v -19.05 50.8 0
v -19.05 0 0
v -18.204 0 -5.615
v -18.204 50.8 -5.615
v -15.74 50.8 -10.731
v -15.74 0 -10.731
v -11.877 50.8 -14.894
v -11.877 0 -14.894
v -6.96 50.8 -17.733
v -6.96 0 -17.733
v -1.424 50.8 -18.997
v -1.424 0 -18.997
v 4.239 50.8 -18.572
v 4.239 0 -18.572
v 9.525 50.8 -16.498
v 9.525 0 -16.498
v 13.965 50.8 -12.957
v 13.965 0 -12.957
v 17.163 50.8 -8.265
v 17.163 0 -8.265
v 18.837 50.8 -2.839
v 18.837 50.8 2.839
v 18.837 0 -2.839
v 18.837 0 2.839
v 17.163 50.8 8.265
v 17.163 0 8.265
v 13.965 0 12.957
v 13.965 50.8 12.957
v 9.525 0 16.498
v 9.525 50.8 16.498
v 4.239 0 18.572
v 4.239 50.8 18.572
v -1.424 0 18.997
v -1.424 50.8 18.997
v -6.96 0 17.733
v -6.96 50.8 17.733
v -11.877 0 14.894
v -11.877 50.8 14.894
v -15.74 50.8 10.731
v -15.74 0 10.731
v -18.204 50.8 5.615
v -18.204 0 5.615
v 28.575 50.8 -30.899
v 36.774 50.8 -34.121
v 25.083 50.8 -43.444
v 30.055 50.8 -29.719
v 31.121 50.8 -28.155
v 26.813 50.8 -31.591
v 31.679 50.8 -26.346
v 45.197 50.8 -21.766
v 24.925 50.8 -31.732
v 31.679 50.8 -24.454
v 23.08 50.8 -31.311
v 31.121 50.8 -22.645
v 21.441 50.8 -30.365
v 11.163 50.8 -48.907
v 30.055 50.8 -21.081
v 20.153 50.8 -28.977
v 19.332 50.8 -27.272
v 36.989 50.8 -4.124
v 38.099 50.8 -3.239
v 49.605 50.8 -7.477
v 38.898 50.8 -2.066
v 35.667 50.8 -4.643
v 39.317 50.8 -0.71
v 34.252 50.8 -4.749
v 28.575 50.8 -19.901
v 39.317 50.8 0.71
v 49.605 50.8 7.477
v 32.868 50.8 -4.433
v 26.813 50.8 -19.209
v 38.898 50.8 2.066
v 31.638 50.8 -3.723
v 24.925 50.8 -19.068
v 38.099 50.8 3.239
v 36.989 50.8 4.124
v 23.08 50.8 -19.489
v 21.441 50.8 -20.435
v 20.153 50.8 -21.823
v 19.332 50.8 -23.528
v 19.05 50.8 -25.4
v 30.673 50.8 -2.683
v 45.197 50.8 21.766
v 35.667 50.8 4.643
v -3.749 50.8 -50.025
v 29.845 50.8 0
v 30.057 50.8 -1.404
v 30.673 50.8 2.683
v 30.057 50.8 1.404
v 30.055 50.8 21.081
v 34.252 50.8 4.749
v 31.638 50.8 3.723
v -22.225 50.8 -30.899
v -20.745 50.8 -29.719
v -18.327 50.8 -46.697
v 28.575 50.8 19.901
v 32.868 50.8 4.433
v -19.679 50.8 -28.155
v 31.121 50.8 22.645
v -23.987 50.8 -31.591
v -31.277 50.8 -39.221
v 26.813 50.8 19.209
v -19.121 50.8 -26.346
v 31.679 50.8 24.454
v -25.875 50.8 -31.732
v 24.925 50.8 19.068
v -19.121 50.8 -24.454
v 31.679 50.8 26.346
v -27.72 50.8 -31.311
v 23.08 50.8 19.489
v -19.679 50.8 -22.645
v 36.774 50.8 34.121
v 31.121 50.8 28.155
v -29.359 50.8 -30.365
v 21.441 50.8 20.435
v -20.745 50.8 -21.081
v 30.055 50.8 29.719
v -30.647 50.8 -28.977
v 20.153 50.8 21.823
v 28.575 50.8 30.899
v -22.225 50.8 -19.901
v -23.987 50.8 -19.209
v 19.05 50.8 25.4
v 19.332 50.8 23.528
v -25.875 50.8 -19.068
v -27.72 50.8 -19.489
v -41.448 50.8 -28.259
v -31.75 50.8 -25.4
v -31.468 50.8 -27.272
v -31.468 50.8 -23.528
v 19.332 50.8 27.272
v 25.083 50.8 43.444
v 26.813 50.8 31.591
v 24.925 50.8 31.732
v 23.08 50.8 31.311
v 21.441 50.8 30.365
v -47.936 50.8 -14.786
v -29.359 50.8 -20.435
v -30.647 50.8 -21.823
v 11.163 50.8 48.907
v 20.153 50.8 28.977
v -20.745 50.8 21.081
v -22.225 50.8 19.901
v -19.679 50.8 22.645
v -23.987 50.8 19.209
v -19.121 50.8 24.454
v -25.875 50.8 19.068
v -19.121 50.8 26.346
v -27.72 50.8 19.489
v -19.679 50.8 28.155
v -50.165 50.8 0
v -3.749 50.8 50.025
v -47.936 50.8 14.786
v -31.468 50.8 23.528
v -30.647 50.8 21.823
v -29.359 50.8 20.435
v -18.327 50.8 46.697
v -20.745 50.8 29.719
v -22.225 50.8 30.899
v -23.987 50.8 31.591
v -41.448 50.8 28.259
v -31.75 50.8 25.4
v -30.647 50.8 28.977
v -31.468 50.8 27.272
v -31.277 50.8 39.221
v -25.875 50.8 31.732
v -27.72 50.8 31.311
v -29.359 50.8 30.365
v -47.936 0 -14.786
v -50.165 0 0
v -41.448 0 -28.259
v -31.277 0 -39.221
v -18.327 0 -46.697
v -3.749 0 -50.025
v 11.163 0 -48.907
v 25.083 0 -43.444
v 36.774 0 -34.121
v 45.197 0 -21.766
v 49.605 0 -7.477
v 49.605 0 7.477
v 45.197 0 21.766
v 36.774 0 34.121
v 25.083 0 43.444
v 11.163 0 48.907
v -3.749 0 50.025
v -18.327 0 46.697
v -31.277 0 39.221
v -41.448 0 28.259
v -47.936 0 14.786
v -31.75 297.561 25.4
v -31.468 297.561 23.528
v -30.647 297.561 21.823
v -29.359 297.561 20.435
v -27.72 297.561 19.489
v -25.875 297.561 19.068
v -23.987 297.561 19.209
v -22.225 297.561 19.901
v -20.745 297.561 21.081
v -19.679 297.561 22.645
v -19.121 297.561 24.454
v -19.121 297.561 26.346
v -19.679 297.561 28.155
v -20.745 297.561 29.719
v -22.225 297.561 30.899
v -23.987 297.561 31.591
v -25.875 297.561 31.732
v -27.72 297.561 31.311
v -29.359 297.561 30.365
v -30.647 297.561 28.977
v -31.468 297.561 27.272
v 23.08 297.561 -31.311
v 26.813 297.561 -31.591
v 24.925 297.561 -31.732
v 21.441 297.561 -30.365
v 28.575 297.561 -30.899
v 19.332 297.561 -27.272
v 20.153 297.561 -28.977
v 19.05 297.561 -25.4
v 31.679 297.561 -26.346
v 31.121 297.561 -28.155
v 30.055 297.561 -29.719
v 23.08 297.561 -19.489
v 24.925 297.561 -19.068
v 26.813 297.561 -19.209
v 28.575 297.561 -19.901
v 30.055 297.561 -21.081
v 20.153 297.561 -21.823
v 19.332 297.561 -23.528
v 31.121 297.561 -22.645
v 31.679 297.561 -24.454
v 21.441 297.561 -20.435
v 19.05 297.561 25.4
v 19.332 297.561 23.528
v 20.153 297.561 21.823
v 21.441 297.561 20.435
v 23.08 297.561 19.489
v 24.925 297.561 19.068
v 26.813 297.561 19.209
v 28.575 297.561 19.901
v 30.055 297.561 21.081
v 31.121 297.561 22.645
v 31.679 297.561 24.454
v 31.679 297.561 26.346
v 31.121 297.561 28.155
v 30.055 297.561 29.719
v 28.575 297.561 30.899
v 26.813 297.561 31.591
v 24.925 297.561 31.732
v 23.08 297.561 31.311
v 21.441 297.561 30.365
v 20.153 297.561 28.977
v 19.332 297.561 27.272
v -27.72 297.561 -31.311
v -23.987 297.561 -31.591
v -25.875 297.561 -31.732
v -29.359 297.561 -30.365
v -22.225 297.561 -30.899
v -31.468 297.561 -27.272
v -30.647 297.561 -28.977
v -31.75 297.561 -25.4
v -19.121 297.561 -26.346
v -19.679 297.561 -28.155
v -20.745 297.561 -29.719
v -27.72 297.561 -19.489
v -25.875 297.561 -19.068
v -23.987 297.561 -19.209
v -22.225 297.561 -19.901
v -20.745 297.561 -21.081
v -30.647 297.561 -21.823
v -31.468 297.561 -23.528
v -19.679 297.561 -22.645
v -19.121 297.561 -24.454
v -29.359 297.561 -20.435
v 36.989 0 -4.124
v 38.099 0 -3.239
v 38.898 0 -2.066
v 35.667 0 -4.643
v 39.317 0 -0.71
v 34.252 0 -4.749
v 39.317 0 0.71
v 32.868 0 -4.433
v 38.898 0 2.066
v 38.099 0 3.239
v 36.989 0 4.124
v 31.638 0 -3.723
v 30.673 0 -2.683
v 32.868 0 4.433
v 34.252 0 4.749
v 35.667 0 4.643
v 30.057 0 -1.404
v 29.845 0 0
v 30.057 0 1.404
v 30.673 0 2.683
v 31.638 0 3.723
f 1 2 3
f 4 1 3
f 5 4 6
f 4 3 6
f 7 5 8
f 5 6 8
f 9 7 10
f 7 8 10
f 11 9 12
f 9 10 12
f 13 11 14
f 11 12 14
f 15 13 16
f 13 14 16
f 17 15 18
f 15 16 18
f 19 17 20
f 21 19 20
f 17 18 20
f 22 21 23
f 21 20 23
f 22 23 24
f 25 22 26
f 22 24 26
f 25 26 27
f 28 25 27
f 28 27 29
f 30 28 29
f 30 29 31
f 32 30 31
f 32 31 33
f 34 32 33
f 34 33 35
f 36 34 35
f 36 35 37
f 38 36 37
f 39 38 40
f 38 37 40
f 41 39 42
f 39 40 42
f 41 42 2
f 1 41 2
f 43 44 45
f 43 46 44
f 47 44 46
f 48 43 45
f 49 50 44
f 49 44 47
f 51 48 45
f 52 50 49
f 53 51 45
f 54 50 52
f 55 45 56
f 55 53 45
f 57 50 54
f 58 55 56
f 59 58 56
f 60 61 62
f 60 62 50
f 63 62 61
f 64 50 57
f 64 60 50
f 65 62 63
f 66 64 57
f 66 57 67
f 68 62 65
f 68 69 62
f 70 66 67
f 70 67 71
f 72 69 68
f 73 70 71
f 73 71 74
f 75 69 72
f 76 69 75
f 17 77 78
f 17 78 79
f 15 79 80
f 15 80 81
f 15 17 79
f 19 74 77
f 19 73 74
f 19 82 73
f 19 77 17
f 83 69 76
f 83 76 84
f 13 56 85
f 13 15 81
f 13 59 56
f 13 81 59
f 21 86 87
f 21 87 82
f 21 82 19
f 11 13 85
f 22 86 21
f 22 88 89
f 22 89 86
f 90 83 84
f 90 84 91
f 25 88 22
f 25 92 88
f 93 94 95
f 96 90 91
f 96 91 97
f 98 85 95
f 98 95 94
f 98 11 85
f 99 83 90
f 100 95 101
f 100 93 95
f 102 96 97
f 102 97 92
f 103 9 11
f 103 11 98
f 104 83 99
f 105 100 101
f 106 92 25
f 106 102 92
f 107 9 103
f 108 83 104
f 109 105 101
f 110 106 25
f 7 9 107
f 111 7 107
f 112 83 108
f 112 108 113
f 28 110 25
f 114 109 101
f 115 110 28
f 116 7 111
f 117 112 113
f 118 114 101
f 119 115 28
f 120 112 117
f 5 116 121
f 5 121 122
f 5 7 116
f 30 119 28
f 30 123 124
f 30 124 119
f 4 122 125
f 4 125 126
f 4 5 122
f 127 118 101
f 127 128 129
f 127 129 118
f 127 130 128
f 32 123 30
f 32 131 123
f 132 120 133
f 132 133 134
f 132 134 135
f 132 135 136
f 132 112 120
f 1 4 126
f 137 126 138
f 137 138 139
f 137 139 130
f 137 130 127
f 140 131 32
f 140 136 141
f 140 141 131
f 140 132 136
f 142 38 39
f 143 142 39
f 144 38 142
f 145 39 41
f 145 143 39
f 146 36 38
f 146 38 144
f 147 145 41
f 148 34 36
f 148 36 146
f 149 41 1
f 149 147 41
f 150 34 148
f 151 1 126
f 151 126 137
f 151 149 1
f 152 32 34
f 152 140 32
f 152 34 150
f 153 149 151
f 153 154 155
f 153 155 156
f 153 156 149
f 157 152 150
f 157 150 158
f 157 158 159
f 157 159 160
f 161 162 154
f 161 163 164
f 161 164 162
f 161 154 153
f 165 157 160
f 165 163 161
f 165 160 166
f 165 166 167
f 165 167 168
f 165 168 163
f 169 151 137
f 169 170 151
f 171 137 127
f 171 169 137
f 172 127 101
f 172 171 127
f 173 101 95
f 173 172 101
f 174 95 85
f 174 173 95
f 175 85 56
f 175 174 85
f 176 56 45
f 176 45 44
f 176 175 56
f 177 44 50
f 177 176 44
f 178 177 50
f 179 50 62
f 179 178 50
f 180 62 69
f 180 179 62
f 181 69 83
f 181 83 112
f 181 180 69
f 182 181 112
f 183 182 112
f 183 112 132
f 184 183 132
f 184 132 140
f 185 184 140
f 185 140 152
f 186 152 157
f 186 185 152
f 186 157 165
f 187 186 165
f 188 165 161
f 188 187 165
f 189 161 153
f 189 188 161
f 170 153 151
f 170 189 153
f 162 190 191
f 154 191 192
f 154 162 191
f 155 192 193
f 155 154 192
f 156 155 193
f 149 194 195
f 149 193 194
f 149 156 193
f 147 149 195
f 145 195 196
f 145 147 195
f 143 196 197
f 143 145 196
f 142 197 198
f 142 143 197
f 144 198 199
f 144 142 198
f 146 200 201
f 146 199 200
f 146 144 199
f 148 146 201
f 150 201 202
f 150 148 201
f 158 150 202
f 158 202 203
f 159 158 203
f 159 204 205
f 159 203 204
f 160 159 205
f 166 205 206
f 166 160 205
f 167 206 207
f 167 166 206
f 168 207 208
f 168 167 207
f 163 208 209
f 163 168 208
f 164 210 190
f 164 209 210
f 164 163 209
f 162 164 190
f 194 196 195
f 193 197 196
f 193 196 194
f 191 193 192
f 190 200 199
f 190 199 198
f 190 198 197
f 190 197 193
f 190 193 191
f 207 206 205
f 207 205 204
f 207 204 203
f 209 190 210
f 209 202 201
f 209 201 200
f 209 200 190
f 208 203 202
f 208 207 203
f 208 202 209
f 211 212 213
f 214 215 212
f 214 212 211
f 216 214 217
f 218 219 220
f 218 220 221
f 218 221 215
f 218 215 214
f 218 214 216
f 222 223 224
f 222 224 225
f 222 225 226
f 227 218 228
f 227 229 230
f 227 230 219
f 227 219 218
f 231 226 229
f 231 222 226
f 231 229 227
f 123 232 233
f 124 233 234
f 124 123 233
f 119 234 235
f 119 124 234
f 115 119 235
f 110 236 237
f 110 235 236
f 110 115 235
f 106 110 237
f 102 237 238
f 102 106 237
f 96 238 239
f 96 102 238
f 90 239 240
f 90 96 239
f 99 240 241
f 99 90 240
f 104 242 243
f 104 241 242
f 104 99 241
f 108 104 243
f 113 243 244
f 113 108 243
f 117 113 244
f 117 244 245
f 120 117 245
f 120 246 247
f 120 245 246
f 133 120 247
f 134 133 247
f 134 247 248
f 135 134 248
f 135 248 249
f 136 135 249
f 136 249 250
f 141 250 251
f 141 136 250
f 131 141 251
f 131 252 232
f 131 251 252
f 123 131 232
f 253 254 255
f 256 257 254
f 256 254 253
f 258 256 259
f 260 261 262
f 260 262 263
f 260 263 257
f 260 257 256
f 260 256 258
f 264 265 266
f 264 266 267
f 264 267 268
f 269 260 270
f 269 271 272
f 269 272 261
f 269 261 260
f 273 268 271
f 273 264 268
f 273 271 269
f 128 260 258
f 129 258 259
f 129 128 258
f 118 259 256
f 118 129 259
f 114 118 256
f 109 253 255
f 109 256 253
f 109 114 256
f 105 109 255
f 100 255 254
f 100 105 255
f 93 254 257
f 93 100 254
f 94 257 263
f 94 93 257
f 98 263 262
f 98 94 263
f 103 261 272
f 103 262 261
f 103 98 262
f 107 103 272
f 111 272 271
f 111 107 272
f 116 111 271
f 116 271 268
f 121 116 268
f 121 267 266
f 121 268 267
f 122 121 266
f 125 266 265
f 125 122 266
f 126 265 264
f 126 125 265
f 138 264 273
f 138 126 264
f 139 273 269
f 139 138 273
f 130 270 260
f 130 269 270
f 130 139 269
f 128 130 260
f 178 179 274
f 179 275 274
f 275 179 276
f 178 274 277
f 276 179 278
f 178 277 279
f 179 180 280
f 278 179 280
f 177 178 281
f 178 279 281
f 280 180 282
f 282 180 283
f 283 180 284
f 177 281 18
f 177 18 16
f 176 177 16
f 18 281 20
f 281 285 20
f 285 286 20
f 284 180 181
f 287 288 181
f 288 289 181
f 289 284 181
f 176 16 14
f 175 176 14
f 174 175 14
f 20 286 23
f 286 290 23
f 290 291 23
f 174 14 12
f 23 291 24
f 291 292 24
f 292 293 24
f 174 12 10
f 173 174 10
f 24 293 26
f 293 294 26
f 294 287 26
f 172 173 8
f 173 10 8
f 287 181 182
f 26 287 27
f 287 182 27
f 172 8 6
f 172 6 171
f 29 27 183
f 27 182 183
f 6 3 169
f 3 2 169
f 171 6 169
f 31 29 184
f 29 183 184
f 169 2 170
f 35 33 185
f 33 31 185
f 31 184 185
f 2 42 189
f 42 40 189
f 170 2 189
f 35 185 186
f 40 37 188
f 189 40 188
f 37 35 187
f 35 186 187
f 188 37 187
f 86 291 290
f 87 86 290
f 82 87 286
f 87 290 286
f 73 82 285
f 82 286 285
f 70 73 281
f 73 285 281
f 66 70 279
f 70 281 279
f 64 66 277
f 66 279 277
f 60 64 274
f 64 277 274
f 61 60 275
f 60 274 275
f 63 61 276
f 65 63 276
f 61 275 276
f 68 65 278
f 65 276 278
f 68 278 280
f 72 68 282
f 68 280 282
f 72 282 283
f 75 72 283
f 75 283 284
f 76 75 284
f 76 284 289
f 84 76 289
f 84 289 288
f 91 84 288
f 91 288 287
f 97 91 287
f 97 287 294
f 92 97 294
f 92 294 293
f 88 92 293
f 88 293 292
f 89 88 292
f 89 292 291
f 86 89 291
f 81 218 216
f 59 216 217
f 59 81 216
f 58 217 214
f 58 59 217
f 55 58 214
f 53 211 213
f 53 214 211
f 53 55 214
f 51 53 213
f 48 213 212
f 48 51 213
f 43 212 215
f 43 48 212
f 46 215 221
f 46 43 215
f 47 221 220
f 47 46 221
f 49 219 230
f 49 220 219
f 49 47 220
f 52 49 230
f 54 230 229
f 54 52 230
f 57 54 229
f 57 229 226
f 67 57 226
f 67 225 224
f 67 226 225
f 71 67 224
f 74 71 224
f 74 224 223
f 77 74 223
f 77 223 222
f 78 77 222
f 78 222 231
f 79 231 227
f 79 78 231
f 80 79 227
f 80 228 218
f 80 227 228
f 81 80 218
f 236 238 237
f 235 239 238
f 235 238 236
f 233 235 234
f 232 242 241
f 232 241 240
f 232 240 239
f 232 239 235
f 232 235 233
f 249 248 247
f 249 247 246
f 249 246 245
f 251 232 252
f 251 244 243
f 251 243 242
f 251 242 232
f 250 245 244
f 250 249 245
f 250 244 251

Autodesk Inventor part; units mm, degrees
ref_plane "YZ Plane" through (0, 0, 0) normal (1, 0, 0) x (0, 1, 0)
ref_plane "XZ Plane" through (0, 0, 0) normal (0, 1, 0) x (-1, 0, 0)
ref_plane "XY Plane" through (0, 0, 0) normal (0, 0, 1) x (1, 0, 0)
sketch "Sketch1" plane through (0, 0, 0) normal (0, 1, 0) x (-1, 0, 0)
  circle A0 centre (0, 0) radius 50.165
  circle A1 centre (0, 0) radius 19.05
  line L0 (0, 50.165) -> (0, -50.165)
  line L1 (50.165, 0) -> (-50.165, 0)
  line L2 (0, 0) -> (-31.75, 0)
  line L3 (0, 0) -> (-25.4, 0)
  line L4 (0, 25.4) -> (0, 0)
  circle A2 centre (-25.4, 25.4) radius 6.35
  circle A3 centre (25.4, 25.4) radius 6.35
  circle A4 centre (-25.4, -25.4) radius 6.35
  circle A5 centre (25.4, -25.4) radius 6.35
  line L5 (-19.05, 0) -> (-50.165, 0)
  circle A6 centre (-34.6075, 0) radius 4.7625
  dimension "d1" = 38.1
  dimension "d0" = 100.33
  dimension "d6" = 31.75
  dimension "d10" = 12.7
  dimension "d13" = 9.525
extrude "Extrusion1" add sketch "Sketch1" along normal blind 50.8 contours L1 A1 L0 A0 | A0 L0 A1 L1 | L0 A1 L1 A6 A0 | A0 L1 A6 A1 L0 | L1 L0 A1 | A1 L0 L1 | A1 L1 L0 | L0 L1 A1 | A6 L1 | L1 A6 | A2 | A3 | A4 | A5
extrude "Extrusion2" cut sketch "Sketch1" along normal blind 285.242 contours L1 L0 A1 | A1 L0 L1 | A1 L1 L0 | L0 L1 A1
extrude "Extrusion3" add sketch "Sketch1" along normal blind 297.561 contours A2 | A3 | A4 | A5
extrude "Extrusion4" cut sketch "Sketch1" along normal blind 79.375 contours A6 L1 | L1 A6
properties part number "Chamber Top"
